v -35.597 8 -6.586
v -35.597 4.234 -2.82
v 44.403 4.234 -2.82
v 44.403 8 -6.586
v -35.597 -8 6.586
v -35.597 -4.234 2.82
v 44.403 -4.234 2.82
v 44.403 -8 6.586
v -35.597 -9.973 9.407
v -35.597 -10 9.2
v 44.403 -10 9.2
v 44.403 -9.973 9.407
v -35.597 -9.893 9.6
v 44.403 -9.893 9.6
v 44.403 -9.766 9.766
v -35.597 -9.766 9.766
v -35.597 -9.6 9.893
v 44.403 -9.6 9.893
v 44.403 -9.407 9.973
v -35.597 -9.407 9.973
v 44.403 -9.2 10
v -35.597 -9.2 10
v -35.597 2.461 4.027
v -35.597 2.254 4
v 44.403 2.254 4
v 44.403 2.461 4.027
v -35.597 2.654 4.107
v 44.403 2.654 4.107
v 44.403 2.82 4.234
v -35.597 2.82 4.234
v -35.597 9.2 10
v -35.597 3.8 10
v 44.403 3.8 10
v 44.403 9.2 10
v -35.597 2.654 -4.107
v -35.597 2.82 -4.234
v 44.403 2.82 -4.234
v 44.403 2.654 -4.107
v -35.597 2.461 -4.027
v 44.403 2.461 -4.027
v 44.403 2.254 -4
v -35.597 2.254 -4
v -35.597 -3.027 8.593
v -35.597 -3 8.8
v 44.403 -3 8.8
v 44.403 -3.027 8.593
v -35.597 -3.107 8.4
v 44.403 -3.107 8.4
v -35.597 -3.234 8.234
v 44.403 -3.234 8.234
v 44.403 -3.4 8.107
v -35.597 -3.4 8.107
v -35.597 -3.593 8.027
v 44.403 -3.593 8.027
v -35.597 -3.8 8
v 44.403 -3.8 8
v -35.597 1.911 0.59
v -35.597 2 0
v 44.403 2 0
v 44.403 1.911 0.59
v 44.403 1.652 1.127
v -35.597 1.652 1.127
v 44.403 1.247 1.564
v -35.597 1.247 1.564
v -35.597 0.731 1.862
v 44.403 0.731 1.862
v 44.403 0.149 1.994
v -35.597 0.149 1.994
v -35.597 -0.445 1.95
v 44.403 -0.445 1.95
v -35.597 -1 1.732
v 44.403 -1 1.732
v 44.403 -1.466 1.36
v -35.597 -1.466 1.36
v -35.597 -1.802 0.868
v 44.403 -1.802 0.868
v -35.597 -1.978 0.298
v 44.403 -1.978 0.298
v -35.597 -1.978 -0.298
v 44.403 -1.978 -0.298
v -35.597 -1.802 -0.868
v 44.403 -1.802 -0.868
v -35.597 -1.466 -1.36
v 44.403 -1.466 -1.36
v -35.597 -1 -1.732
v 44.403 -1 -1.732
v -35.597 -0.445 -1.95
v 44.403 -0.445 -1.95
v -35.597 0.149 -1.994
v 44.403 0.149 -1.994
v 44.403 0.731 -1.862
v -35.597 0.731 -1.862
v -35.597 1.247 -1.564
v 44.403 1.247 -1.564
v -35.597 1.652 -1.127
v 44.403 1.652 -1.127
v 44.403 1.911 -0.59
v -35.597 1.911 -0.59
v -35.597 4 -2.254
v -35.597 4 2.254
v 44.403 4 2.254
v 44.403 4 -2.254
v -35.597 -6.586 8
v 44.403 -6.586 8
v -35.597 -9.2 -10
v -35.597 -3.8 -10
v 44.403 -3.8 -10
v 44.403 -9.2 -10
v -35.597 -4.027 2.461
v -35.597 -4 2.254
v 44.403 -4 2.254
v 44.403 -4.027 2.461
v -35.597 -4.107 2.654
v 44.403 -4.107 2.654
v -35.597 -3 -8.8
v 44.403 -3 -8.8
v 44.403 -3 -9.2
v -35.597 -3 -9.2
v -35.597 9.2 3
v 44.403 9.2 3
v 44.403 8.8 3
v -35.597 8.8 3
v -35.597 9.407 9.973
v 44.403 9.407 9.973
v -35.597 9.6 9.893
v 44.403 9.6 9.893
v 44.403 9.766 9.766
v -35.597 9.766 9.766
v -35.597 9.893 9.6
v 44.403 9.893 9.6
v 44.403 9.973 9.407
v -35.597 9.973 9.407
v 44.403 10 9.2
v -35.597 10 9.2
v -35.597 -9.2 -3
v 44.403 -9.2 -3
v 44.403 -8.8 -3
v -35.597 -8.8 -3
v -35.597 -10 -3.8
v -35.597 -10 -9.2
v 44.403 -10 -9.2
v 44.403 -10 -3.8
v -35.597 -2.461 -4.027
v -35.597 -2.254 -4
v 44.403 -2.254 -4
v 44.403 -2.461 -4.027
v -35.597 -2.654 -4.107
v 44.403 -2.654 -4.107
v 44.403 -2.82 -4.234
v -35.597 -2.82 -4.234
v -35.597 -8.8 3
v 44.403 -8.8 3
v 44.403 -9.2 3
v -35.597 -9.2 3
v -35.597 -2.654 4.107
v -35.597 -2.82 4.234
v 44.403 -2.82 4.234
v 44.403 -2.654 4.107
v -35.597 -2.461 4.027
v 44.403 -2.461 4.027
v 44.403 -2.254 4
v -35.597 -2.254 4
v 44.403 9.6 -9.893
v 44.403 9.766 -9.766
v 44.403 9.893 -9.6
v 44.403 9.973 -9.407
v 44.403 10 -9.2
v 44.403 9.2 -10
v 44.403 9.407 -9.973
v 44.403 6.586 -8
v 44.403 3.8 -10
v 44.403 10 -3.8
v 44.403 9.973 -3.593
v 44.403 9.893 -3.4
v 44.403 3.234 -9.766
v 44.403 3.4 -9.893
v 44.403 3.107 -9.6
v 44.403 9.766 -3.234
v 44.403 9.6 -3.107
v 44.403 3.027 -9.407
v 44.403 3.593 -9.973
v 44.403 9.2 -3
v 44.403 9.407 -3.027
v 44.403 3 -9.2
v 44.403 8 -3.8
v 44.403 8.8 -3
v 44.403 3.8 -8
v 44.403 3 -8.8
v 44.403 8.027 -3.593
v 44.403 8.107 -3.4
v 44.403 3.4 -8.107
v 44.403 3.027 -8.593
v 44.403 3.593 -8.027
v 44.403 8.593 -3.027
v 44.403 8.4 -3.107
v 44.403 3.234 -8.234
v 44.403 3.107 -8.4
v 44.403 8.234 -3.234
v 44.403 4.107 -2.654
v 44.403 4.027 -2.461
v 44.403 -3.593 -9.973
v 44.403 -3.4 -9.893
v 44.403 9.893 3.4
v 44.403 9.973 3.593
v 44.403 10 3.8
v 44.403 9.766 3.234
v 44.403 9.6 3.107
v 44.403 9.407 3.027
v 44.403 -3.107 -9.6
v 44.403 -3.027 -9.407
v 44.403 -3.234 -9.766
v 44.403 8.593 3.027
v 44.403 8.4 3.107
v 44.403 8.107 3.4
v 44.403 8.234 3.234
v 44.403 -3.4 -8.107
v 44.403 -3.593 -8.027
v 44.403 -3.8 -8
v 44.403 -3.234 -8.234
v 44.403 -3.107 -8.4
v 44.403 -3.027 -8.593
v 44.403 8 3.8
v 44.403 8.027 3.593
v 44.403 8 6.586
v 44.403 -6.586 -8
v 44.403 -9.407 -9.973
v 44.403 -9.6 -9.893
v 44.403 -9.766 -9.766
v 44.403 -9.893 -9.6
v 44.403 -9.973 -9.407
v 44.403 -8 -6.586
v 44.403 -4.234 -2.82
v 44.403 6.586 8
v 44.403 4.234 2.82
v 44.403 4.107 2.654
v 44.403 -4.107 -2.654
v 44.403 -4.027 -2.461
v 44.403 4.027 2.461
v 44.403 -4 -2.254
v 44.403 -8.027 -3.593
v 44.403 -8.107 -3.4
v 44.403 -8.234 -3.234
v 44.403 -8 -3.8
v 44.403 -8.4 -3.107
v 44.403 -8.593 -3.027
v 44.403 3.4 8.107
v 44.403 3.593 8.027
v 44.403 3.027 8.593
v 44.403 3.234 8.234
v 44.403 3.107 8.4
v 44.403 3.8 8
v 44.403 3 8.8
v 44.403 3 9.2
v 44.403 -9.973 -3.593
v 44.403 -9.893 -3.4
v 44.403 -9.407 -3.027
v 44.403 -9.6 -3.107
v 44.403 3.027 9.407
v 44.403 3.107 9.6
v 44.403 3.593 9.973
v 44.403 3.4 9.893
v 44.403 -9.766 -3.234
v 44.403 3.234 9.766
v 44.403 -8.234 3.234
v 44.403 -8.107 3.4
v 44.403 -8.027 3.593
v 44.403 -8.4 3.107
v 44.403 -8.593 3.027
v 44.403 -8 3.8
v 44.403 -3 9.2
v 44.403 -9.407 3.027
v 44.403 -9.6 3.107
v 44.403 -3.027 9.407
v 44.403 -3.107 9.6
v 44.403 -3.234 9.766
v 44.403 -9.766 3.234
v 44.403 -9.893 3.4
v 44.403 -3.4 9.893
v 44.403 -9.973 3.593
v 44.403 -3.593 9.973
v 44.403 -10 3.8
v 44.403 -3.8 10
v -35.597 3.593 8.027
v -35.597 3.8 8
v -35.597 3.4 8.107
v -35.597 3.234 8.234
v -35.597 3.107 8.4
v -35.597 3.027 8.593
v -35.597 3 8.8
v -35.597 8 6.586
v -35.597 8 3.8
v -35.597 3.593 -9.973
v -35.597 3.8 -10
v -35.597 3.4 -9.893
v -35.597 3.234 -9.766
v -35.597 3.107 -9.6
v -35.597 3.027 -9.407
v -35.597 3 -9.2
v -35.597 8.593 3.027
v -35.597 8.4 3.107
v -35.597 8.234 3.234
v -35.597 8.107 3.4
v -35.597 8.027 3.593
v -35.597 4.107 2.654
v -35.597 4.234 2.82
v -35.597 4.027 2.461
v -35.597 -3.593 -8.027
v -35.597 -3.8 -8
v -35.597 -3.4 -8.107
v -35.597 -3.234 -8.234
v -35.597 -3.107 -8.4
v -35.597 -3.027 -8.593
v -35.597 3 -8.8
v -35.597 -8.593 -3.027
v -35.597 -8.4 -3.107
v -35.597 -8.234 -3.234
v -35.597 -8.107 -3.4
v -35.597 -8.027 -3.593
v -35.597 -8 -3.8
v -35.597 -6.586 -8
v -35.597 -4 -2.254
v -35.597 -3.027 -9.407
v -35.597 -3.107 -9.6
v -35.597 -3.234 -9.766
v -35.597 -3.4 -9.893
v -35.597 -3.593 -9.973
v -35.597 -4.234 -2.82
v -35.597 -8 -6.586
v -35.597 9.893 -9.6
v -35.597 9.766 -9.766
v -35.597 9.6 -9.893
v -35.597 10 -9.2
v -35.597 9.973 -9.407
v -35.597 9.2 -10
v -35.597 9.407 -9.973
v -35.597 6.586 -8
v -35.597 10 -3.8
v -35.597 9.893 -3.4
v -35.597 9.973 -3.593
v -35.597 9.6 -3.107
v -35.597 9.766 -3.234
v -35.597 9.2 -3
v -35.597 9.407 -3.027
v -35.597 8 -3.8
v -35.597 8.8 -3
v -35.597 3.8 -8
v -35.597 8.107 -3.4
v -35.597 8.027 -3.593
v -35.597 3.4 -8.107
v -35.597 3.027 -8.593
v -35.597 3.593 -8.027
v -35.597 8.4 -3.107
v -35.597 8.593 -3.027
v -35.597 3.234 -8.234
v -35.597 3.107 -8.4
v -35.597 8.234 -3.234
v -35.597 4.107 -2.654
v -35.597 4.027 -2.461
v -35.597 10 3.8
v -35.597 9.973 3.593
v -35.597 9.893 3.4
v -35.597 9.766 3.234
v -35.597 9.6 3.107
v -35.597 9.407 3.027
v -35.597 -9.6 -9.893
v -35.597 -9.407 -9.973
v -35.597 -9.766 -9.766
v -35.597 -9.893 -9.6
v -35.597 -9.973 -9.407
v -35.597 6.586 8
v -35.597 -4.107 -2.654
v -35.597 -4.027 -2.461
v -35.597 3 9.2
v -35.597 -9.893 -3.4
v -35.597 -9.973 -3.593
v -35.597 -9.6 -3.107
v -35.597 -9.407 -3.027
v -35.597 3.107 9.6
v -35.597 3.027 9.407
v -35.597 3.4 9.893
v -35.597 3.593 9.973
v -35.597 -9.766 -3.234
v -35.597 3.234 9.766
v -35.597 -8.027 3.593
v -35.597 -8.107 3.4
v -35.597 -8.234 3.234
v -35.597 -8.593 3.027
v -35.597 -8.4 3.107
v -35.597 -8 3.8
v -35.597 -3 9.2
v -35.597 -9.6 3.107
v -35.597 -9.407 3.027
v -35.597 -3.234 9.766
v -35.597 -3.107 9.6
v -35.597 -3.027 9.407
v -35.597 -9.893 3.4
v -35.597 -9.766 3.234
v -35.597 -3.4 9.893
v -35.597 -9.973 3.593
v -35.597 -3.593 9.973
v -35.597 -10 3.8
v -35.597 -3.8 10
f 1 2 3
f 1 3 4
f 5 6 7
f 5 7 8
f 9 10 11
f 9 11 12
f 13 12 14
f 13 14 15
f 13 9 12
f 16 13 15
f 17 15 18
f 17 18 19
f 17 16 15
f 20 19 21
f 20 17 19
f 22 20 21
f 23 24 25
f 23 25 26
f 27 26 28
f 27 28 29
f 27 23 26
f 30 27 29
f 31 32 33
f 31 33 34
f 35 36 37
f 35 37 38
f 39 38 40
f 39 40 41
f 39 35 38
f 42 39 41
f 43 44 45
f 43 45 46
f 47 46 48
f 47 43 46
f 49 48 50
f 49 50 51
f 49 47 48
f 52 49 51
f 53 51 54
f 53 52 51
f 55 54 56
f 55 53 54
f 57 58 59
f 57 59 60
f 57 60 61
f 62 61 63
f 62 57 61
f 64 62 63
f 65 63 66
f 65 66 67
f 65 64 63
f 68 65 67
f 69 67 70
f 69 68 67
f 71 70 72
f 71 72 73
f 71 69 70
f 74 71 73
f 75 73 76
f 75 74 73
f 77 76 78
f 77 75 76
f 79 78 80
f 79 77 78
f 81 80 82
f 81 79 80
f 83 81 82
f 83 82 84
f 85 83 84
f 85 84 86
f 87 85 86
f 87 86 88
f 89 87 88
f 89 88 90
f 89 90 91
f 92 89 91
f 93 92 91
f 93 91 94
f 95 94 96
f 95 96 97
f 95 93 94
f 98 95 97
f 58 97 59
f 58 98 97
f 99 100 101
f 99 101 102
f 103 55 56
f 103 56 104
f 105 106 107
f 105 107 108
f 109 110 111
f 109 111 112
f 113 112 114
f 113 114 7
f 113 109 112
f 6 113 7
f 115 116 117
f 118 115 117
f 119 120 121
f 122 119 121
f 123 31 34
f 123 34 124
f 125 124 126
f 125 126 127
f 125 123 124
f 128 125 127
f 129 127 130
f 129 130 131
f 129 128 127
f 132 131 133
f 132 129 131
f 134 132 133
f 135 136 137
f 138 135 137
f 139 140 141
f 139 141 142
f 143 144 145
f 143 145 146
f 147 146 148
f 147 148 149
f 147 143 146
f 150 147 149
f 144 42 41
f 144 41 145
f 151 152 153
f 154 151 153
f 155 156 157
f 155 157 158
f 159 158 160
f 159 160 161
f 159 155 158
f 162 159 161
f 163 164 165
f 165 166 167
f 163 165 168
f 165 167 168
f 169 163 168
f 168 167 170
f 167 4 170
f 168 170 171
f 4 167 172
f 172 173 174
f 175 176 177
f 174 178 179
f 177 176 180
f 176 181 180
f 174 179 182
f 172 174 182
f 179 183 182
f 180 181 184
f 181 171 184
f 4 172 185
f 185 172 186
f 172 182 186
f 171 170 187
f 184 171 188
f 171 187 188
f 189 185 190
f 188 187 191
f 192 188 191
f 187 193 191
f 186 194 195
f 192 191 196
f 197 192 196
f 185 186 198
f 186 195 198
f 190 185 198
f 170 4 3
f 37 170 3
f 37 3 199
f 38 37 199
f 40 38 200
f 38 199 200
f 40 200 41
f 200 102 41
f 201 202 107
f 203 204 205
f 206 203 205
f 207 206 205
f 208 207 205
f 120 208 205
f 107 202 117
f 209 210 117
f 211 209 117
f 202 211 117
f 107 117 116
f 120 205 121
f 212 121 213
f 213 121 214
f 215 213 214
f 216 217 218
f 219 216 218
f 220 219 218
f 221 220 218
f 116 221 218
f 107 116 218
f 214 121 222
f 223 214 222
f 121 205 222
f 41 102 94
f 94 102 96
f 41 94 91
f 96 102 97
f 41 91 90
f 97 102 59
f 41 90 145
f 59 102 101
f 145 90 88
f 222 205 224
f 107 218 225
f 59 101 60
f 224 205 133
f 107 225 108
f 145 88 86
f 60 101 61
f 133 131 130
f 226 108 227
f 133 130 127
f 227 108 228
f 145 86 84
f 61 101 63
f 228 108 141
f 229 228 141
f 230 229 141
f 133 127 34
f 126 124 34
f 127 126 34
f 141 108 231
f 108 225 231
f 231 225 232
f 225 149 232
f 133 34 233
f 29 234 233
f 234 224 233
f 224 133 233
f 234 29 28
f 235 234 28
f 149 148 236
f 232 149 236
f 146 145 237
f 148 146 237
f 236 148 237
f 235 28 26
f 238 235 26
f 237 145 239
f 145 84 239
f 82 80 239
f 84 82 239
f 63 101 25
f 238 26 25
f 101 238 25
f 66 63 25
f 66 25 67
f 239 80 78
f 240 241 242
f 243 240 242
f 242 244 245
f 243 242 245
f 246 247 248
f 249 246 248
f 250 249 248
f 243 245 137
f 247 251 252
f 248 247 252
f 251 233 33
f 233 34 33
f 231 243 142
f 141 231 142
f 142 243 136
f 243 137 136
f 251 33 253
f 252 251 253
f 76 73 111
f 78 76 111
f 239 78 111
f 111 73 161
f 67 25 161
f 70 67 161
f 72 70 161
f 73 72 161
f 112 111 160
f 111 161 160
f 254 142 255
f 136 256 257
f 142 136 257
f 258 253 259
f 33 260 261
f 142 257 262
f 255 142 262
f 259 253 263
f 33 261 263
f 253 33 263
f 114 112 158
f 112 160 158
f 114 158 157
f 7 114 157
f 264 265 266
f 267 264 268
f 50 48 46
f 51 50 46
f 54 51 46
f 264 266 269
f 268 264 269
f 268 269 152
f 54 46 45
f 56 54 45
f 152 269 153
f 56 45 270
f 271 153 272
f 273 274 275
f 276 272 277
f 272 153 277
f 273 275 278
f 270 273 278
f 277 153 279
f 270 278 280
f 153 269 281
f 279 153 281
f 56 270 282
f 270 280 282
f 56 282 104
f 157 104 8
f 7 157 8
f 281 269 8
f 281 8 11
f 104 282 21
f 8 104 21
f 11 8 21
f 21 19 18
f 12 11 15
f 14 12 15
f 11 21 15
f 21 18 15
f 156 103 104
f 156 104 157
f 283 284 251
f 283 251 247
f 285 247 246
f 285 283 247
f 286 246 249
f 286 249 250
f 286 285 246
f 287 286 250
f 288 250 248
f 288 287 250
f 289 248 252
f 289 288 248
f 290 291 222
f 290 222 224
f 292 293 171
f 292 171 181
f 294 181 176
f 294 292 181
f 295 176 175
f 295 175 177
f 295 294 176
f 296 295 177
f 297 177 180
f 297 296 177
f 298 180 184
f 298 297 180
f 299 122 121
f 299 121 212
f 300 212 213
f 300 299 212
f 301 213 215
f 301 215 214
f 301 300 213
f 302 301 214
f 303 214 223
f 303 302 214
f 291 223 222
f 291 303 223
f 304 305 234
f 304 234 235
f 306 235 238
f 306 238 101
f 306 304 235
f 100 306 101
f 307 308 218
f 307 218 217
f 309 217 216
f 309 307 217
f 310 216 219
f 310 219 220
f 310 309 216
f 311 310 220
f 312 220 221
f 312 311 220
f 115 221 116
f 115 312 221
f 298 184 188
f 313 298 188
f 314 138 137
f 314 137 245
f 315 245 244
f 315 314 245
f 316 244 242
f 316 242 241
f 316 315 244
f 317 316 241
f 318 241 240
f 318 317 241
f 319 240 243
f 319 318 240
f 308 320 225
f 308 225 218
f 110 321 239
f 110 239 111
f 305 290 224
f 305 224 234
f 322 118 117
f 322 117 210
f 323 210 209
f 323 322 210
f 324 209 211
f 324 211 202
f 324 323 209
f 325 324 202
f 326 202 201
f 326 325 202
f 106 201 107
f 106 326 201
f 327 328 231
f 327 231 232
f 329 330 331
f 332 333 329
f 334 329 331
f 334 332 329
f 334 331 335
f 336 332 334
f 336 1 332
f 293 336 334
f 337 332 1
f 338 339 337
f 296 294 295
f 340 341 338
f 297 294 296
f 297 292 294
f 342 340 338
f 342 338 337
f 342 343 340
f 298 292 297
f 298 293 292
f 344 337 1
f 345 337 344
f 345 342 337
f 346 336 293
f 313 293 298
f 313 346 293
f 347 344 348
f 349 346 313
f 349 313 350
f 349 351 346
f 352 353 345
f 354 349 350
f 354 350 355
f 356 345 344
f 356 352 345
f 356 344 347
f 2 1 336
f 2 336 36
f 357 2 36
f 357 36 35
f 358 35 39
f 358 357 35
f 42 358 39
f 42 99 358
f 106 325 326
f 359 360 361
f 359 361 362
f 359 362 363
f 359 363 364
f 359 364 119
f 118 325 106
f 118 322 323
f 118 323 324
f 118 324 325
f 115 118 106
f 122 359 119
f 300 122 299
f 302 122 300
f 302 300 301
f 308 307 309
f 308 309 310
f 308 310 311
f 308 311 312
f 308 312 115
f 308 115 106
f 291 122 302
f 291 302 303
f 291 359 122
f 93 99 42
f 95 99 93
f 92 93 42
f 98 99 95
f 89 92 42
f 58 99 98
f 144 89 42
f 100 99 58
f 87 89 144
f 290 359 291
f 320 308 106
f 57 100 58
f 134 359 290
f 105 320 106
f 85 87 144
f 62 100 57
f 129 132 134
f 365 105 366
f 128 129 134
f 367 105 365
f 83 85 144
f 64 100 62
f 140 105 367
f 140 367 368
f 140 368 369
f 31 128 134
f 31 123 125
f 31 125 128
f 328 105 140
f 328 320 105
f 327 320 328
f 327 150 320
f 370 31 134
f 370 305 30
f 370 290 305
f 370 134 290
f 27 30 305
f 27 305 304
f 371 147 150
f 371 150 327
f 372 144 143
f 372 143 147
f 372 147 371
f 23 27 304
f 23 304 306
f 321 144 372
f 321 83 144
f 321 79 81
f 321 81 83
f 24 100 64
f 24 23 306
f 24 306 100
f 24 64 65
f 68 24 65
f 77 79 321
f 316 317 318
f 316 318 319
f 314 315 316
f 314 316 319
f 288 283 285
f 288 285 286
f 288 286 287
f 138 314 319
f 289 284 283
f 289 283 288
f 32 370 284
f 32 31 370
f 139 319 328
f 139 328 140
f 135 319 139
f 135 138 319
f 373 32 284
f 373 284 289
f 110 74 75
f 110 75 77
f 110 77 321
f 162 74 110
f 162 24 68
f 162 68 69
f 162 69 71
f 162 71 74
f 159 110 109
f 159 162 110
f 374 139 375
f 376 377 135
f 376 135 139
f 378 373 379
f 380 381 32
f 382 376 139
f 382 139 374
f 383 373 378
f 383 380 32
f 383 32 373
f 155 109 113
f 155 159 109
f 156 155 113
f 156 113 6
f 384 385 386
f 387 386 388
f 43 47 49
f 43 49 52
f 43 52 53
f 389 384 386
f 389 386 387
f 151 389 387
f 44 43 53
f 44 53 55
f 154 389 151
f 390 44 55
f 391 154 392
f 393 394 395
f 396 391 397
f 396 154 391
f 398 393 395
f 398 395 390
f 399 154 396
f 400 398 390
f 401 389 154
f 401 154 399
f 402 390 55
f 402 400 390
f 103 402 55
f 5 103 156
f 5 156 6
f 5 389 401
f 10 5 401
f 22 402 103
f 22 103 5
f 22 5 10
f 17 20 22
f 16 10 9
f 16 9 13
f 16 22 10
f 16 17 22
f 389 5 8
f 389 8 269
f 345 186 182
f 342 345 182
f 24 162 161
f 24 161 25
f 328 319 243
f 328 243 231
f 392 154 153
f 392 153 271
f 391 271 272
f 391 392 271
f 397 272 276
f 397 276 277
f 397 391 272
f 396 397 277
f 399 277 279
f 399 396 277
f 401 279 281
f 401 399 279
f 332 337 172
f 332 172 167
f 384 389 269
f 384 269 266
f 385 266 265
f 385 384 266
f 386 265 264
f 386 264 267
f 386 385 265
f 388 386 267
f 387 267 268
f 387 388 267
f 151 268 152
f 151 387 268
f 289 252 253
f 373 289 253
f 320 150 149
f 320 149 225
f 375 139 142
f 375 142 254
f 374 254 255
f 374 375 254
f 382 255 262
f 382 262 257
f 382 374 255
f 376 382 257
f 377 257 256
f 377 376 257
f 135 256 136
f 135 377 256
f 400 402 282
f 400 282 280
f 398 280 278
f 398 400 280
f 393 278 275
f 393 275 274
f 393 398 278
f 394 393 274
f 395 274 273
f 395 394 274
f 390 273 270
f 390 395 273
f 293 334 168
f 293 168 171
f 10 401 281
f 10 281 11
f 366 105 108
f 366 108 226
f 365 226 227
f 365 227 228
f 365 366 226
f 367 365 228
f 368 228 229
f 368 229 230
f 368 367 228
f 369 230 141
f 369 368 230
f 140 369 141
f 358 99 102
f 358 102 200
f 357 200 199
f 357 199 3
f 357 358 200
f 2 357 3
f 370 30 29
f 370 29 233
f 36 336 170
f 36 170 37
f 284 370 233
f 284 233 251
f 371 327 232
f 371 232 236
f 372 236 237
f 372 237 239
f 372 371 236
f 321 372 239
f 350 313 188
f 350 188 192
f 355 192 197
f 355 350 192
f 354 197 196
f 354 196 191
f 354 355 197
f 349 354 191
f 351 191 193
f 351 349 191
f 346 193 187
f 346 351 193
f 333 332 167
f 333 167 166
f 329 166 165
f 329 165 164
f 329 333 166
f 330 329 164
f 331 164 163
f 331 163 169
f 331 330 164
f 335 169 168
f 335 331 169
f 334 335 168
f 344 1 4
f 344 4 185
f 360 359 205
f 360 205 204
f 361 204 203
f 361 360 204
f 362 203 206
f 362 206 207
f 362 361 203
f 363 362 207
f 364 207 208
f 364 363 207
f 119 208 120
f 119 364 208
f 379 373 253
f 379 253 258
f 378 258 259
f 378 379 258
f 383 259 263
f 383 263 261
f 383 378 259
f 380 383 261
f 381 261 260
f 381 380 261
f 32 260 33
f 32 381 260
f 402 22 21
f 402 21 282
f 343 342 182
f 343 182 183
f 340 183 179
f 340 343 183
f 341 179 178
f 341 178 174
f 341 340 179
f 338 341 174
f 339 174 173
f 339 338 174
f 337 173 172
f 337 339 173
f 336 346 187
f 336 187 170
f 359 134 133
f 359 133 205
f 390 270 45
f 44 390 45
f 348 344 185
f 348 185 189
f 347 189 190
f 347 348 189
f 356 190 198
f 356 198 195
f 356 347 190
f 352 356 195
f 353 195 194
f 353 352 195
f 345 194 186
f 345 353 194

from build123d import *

# Parameters (mm, degrees)
SKETCH11_R          = 2
PROFILE_4X4_1_DEPTH = 80


with BuildPart() as part:
    # Sketch11 → Profile 4X4(1) (new body)
    with BuildSketch(Plane.YZ.offset(-35.597484277)):
        with BuildLine():
            Line((-3, 9.2), (-3, 8.8))
            ThreePointArc((-3, 8.8), (-3.234314575, 8.234314575), (-3.8, 8))
            Line((-3.8, 8), (-6.585786438, 8))
            Line((-6.585786438, 8), (-2.820101013, 4.234314575))
            ThreePointArc((-2.820101013, 4.234314575), (-2.560562334, 4.060896374), (-2.254415588, 4))
            Line((-2.254415588, 4), (2.254415588, 4))
            ThreePointArc((2.254415588, 4), (2.560562334, 4.060896374), (2.820101013, 4.234314575))
            Line((2.820101013, 4.234314575), (6.585786438, 8))
            Line((6.585786438, 8), (3.8, 8))
            ThreePointArc((3.8, 8), (3.234314575, 8.234314575), (3, 8.8))
            Line((3, 8.8), (3, 9.2))
            ThreePointArc((3, 9.2), (3.234314575, 9.765685425), (3.8, 10))
            Line((3.8, 10), (9.2, 10))
            ThreePointArc((9.2, 10), (9.765685425, 9.765685425), (10, 9.2))
            Line((10, 9.2), (10, 3.8))
            ThreePointArc((10, 3.8), (9.765685425, 3.234314575), (9.2, 3))
            Line((9.2, 3), (8.8, 3))
            ThreePointArc((8.8, 3), (8.234314575, 3.234314575), (8, 3.8))
            Line((8, 3.8), (8, 6.585786438))
            Line((8, 6.585786438), (4.234314575, 2.820101013))
            ThreePointArc((4.234314575, 2.820101013), (4.060896374, 2.560562334), (4, 2.254415588))
            Line((4, 2.254415588), (4, -2.254415588))
            ThreePointArc((4, -2.254415588), (4.060896374, -2.560562334), (4.234314575, -2.820101013))
            Line((4.234314575, -2.820101013), (8, -6.585786438))
            Line((8, -6.585786438), (8, -3.8))
            ThreePointArc((8, -3.8), (8.234314575, -3.234314575), (8.8, -3))
            Line((8.8, -3), (9.2, -3))
            ThreePointArc((9.2, -3), (9.765685425, -3.234314575), (10, -3.8))
            Line((10, -3.8), (10, -9.2))
            ThreePointArc((10, -9.2), (9.765685425, -9.765685425), (9.2, -10))
            Line((9.2, -10), (3.8, -10))
            ThreePointArc((3.8, -10), (3.234314575, -9.765685425), (3, -9.2))
            Line((3, -9.2), (3, -8.8))
            ThreePointArc((3, -8.8), (3.234314575, -8.234314575), (3.8, -8))
            Line((3.8, -8), (6.585786438, -8))
            Line((6.585786438, -8), (2.820101013, -4.234314575))
            ThreePointArc((2.820101013, -4.234314575), (2.560562334, -4.060896374), (2.254415588, -4))
            Line((2.254415588, -4), (-2.254415588, -4))
            ThreePointArc((-2.254415588, -4), (-2.560562334, -4.060896374), (-2.820101013, -4.234314575))
            Line((-2.820101013, -4.234314575), (-6.585786438, -8))
            Line((-6.585786438, -8), (-3.8, -8))
            ThreePointArc((-3.8, -8), (-3.234314575, -8.234314575), (-3, -8.8))
            Line((-3, -8.8), (-3, -9.2))
            ThreePointArc((-3, -9.2), (-3.234314575, -9.765685425), (-3.8, -10))
            Line((-3.8, -10), (-9.2, -10))
            ThreePointArc((-9.2, -10), (-9.765685425, -9.765685425), (-10, -9.2))
            Line((-10, -9.2), (-10, -3.8))
            ThreePointArc((-10, -3.8), (-9.765685425, -3.234314575), (-9.2, -3))
            Line((-9.2, -3), (-8.8, -3))
            ThreePointArc((-8.8, -3), (-8.234314575, -3.234314575), (-8, -3.8))
            Line((-8, -3.8), (-8, -6.585786438))
            Line((-8, -6.585786438), (-4.234314575, -2.820101013))
            ThreePointArc((-4.234314575, -2.820101013), (-4.060896374, -2.560562334), (-4, -2.254415588))
            Line((-4, -2.254415588), (-4, 2.254415588))
            ThreePointArc((-4, 2.254415588), (-4.060896374, 2.560562334), (-4.234314575, 2.820101013))
            Line((-4.234314575, 2.820101013), (-8, 6.585786438))
            Line((-8, 6.585786438), (-8, 3.8))
            ThreePointArc((-8, 3.8), (-8.234314575, 3.234314575), (-8.8, 3))
            Line((-8.8, 3), (-9.2, 3))
            ThreePointArc((-9.2, 3), (-9.765685425, 3.234314575), (-10, 3.8))
            Line((-10, 3.8), (-10, 9.2))
            ThreePointArc((-10, 9.2), (-9.765685425, 9.765685425), (-9.2, 10))
            Line((-9.2, 10), (-3.8, 10))
            ThreePointArc((-3.8, 10), (-3.234314575, 9.765685425), (-3, 9.2))
        make_face()
        Circle(SKETCH11_R, mode=Mode.SUBTRACT)
    extrude(amount=PROFILE_4X4_1_DEPTH)


solid = part.part
